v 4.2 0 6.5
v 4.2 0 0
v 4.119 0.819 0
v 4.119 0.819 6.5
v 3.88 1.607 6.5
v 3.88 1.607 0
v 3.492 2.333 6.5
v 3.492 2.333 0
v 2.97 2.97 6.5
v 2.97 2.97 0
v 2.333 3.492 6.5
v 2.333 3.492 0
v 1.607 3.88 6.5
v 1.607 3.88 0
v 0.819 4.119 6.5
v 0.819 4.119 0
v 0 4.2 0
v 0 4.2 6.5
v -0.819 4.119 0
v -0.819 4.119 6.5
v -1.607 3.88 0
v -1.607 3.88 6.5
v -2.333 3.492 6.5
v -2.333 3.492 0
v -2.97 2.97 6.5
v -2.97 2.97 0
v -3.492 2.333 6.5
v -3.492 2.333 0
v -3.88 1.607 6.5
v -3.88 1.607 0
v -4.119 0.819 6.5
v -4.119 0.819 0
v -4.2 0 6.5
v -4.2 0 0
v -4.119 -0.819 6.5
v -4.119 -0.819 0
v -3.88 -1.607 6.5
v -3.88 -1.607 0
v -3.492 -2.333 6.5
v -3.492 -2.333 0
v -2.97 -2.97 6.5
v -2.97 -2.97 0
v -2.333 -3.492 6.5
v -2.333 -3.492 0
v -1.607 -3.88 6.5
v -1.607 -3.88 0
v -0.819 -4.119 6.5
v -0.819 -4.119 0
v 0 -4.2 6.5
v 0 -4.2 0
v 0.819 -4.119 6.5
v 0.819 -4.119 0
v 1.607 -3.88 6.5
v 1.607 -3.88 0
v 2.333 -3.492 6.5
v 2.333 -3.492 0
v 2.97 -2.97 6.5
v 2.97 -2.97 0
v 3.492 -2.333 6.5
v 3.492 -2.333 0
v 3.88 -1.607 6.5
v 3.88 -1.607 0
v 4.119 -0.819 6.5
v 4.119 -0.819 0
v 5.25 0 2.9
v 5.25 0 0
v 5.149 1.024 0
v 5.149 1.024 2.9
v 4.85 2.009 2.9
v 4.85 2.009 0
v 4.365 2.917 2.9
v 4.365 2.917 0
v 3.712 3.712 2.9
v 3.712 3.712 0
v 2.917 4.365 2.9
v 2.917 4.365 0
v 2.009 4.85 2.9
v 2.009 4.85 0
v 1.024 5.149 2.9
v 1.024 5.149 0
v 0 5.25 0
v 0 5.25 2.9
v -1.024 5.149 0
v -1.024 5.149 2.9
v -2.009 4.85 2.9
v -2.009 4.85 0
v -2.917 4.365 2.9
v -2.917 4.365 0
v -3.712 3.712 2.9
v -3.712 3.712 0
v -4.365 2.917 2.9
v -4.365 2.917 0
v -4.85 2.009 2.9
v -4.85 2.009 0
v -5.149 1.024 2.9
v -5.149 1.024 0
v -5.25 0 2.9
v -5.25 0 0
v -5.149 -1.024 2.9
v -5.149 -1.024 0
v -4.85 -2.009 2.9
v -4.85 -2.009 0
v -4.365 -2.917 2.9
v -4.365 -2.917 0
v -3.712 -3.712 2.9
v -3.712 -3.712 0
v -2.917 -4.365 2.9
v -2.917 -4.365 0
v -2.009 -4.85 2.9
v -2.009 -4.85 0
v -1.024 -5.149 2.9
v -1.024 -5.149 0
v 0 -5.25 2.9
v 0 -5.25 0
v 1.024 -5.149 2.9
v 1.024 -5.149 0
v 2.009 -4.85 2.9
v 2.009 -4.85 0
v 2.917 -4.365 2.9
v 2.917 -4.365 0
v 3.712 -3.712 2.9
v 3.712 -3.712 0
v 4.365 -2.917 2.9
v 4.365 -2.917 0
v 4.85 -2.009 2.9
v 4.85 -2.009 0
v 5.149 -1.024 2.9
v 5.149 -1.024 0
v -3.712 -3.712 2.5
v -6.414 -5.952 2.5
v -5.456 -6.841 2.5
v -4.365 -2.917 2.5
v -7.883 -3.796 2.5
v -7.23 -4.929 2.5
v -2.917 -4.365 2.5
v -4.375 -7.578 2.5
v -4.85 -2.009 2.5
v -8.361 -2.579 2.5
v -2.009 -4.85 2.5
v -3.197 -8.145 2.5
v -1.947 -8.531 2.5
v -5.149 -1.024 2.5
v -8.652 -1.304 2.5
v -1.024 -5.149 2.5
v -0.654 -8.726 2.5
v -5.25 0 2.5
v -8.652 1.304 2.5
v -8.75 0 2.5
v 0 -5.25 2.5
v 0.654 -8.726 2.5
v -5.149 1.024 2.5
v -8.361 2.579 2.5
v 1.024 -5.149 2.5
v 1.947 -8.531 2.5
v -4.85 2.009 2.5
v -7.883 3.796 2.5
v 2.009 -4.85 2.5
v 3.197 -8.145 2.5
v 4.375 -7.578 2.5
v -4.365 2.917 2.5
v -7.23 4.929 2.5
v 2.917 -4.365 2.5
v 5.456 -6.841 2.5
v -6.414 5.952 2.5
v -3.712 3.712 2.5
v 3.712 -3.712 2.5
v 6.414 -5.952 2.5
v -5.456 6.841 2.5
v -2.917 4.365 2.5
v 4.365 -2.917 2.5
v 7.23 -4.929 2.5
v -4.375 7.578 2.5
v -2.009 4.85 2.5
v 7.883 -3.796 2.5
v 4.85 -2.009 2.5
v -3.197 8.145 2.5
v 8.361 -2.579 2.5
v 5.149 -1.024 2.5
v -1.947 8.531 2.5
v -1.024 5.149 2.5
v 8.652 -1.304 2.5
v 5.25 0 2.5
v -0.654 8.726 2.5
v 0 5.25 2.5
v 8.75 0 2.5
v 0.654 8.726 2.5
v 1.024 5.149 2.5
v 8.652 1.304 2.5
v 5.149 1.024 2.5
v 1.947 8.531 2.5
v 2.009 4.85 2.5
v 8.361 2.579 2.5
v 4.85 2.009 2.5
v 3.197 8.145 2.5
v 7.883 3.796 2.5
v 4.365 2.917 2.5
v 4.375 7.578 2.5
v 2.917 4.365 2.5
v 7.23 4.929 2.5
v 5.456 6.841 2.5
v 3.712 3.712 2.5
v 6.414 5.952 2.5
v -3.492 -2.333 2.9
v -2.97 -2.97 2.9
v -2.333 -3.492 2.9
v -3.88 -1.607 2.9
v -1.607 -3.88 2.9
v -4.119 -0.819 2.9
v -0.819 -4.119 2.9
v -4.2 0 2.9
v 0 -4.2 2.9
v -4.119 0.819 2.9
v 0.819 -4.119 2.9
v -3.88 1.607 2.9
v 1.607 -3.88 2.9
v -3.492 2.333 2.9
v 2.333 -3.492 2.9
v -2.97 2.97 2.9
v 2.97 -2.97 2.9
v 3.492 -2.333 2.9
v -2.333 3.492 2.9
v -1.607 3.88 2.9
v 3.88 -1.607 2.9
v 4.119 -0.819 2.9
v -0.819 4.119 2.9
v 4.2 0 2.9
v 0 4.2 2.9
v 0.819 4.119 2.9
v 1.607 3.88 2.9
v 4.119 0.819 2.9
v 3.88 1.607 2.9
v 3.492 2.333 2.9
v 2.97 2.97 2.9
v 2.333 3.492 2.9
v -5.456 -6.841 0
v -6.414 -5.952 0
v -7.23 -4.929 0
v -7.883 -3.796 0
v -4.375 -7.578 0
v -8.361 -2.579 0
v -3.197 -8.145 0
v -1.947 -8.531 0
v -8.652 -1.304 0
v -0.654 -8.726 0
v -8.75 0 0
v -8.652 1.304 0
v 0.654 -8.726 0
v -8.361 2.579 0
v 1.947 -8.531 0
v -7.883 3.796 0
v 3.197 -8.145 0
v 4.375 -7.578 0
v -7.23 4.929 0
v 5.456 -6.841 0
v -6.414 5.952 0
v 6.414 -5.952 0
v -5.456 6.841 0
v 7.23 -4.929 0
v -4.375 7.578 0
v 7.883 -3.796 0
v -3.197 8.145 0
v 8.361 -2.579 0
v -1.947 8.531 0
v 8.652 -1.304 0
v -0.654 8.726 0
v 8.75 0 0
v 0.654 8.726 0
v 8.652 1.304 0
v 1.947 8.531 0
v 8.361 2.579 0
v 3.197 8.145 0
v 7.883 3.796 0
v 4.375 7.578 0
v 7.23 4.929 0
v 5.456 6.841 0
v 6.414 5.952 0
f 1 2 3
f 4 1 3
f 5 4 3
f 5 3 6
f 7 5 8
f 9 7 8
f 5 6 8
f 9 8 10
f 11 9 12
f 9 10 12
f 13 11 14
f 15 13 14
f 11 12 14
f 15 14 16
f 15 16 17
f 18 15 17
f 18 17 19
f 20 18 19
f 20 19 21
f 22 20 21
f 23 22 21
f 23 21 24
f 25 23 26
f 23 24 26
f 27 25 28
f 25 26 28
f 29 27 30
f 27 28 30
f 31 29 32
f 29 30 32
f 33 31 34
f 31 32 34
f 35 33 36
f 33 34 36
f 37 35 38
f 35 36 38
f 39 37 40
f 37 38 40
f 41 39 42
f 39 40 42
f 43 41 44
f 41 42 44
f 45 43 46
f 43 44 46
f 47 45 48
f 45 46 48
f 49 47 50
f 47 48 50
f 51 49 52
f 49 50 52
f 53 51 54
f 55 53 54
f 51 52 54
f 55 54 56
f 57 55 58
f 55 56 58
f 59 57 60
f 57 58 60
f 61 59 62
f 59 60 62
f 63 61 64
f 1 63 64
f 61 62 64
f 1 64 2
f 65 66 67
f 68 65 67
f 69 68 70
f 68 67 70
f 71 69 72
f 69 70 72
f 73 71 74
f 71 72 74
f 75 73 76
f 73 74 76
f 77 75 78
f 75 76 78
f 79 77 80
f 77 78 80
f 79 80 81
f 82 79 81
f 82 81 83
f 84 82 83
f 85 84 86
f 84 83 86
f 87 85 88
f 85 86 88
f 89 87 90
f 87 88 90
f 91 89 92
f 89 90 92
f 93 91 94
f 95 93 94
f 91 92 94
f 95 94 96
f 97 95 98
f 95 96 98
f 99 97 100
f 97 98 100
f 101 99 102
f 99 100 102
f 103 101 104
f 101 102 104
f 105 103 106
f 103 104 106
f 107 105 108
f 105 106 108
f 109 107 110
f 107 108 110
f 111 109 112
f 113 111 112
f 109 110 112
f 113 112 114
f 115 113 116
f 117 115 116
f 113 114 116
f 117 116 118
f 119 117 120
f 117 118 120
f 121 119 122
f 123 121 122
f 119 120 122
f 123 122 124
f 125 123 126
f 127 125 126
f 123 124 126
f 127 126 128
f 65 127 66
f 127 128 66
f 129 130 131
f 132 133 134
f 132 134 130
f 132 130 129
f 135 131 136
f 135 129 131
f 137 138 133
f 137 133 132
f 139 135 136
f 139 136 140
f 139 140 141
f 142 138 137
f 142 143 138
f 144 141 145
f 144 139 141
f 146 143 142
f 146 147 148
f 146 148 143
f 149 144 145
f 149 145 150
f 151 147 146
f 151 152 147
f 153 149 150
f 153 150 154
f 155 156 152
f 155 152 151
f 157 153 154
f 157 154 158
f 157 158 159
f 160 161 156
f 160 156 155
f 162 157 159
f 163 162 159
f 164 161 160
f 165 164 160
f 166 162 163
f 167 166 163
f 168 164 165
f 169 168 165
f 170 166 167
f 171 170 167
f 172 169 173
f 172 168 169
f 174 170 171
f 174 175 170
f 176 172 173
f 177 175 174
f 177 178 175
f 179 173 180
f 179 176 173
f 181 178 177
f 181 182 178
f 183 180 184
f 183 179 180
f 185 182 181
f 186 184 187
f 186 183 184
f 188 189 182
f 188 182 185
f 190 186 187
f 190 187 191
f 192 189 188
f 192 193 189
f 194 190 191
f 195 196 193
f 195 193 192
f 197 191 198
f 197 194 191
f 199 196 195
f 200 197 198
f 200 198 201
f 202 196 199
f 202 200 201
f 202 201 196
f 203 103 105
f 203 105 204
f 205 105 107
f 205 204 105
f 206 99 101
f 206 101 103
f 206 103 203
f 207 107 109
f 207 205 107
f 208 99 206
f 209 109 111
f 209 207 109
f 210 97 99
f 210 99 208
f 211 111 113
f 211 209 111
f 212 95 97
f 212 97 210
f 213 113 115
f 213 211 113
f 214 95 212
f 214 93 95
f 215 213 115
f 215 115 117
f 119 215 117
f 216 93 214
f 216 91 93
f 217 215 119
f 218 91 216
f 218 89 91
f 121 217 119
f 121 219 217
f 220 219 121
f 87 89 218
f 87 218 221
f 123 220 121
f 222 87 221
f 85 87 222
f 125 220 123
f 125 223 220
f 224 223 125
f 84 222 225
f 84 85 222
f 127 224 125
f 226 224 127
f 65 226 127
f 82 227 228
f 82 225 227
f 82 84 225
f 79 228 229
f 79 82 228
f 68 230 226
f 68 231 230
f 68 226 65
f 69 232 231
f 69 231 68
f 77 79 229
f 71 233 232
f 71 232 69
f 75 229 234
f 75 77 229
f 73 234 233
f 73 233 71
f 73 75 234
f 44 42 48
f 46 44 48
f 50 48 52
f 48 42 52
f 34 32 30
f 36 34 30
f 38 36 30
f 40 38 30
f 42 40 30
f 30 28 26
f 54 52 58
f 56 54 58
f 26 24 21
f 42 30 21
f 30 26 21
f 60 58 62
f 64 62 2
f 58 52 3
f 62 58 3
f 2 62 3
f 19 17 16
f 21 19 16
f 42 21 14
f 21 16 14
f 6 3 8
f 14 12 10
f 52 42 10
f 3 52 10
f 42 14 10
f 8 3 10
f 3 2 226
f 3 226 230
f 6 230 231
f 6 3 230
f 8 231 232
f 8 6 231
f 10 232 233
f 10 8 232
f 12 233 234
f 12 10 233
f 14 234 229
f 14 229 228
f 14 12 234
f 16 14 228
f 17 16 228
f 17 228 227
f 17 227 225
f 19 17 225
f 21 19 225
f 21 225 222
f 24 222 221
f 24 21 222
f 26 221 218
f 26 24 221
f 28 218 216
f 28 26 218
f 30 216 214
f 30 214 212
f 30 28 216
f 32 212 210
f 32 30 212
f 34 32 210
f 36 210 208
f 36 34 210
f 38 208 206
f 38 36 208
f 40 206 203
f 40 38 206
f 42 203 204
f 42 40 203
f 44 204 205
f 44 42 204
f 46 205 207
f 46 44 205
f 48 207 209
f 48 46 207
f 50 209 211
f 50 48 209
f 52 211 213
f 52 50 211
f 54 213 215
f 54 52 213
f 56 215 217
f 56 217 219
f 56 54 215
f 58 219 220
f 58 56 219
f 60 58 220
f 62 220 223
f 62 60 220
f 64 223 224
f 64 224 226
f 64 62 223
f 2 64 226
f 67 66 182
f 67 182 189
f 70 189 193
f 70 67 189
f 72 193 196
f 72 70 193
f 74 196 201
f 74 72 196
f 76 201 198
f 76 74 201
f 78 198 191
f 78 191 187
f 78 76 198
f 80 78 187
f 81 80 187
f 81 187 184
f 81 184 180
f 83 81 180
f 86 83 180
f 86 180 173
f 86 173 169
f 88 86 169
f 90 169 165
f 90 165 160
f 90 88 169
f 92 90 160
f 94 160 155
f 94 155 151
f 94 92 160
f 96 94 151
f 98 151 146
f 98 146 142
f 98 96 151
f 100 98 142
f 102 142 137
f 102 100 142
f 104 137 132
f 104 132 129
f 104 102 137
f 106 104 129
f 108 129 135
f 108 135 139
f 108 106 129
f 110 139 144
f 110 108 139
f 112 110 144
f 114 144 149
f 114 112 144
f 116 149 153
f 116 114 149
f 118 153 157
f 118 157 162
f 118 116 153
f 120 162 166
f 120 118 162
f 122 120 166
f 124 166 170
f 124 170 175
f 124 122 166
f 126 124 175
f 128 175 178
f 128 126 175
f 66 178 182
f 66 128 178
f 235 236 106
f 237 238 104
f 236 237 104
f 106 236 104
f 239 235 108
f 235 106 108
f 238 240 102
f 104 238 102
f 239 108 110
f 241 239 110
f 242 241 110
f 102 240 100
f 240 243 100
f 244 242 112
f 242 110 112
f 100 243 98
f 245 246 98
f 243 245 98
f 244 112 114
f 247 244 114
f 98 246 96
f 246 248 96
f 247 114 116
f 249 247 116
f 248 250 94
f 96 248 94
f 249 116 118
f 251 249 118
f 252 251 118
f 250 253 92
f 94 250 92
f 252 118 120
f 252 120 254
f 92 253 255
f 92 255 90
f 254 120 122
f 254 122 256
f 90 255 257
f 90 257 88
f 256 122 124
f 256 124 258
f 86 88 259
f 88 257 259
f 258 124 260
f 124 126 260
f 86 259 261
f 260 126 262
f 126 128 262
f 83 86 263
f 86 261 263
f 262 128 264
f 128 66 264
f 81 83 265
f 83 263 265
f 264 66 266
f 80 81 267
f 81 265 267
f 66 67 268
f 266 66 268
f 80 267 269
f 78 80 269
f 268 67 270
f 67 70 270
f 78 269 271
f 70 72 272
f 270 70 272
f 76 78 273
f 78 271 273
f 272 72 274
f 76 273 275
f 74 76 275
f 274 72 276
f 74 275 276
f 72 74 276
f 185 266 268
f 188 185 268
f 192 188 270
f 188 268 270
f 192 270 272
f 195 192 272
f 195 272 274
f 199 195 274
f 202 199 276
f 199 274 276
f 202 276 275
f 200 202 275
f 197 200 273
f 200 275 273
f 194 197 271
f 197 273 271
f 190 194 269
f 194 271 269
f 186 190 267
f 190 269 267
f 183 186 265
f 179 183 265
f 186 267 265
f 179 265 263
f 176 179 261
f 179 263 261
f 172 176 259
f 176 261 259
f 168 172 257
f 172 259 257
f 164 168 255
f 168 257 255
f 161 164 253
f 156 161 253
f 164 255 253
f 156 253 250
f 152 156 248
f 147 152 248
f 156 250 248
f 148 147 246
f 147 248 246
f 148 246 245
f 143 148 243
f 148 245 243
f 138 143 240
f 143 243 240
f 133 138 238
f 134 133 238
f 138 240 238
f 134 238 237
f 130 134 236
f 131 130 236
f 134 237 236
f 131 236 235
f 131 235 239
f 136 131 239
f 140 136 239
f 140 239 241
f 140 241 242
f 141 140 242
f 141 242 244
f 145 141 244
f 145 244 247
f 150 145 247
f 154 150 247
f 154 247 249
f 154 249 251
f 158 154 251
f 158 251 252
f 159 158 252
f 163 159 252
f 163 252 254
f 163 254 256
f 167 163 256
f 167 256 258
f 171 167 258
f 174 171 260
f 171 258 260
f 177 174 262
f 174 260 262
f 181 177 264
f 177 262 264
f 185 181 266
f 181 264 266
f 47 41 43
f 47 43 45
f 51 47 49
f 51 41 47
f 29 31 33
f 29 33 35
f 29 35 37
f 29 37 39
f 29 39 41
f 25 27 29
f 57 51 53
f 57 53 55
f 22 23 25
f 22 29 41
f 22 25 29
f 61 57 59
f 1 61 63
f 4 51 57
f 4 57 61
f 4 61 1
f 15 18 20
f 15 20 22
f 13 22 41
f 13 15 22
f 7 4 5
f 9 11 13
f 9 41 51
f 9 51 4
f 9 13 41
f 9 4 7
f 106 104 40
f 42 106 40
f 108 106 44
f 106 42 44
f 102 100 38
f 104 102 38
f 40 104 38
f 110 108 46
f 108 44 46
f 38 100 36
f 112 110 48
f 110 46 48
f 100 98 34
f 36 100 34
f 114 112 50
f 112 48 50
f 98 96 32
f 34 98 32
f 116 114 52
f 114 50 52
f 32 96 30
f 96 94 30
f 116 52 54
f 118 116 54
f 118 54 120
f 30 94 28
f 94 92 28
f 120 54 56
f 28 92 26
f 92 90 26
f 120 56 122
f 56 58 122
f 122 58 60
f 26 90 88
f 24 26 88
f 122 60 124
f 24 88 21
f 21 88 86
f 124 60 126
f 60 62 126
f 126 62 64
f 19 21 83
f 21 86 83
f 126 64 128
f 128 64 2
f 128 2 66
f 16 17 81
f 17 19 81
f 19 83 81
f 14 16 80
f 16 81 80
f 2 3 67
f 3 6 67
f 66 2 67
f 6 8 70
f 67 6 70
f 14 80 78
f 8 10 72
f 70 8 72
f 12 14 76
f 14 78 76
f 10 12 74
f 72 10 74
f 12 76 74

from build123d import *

# Parameters (mm, degrees)
F0_R     = 8.75
F0_R_2   = 5.25
F1_DEPTH = 2.5
F0_R_3   = 4.2
F2_DEPTH = 6.5
F3_DEPTH = 2.9


with BuildPart() as f1:
    # F0 (on Top) → F1 (new body)
    with BuildSketch(Plane.XY):
        Circle(F0_R)
        Circle(F0_R_2, mode=Mode.SUBTRACT)
    extrude(amount=F1_DEPTH)


with BuildPart() as f2:
    # F0 (on Top) → F2 (new body)
    with BuildSketch(Plane.XY):
        Circle(F0_R_3)
    extrude(amount=F2_DEPTH)


with BuildPart() as f3:
    # F0 (on Top) → F3 (new body)
    with BuildSketch(Plane.XY):
        Circle(F0_R_2)
        Circle(F0_R_3, mode=Mode.SUBTRACT)
    extrude(amount=F3_DEPTH)


solid = Compound([f1.part, f2.part, f3.part])
